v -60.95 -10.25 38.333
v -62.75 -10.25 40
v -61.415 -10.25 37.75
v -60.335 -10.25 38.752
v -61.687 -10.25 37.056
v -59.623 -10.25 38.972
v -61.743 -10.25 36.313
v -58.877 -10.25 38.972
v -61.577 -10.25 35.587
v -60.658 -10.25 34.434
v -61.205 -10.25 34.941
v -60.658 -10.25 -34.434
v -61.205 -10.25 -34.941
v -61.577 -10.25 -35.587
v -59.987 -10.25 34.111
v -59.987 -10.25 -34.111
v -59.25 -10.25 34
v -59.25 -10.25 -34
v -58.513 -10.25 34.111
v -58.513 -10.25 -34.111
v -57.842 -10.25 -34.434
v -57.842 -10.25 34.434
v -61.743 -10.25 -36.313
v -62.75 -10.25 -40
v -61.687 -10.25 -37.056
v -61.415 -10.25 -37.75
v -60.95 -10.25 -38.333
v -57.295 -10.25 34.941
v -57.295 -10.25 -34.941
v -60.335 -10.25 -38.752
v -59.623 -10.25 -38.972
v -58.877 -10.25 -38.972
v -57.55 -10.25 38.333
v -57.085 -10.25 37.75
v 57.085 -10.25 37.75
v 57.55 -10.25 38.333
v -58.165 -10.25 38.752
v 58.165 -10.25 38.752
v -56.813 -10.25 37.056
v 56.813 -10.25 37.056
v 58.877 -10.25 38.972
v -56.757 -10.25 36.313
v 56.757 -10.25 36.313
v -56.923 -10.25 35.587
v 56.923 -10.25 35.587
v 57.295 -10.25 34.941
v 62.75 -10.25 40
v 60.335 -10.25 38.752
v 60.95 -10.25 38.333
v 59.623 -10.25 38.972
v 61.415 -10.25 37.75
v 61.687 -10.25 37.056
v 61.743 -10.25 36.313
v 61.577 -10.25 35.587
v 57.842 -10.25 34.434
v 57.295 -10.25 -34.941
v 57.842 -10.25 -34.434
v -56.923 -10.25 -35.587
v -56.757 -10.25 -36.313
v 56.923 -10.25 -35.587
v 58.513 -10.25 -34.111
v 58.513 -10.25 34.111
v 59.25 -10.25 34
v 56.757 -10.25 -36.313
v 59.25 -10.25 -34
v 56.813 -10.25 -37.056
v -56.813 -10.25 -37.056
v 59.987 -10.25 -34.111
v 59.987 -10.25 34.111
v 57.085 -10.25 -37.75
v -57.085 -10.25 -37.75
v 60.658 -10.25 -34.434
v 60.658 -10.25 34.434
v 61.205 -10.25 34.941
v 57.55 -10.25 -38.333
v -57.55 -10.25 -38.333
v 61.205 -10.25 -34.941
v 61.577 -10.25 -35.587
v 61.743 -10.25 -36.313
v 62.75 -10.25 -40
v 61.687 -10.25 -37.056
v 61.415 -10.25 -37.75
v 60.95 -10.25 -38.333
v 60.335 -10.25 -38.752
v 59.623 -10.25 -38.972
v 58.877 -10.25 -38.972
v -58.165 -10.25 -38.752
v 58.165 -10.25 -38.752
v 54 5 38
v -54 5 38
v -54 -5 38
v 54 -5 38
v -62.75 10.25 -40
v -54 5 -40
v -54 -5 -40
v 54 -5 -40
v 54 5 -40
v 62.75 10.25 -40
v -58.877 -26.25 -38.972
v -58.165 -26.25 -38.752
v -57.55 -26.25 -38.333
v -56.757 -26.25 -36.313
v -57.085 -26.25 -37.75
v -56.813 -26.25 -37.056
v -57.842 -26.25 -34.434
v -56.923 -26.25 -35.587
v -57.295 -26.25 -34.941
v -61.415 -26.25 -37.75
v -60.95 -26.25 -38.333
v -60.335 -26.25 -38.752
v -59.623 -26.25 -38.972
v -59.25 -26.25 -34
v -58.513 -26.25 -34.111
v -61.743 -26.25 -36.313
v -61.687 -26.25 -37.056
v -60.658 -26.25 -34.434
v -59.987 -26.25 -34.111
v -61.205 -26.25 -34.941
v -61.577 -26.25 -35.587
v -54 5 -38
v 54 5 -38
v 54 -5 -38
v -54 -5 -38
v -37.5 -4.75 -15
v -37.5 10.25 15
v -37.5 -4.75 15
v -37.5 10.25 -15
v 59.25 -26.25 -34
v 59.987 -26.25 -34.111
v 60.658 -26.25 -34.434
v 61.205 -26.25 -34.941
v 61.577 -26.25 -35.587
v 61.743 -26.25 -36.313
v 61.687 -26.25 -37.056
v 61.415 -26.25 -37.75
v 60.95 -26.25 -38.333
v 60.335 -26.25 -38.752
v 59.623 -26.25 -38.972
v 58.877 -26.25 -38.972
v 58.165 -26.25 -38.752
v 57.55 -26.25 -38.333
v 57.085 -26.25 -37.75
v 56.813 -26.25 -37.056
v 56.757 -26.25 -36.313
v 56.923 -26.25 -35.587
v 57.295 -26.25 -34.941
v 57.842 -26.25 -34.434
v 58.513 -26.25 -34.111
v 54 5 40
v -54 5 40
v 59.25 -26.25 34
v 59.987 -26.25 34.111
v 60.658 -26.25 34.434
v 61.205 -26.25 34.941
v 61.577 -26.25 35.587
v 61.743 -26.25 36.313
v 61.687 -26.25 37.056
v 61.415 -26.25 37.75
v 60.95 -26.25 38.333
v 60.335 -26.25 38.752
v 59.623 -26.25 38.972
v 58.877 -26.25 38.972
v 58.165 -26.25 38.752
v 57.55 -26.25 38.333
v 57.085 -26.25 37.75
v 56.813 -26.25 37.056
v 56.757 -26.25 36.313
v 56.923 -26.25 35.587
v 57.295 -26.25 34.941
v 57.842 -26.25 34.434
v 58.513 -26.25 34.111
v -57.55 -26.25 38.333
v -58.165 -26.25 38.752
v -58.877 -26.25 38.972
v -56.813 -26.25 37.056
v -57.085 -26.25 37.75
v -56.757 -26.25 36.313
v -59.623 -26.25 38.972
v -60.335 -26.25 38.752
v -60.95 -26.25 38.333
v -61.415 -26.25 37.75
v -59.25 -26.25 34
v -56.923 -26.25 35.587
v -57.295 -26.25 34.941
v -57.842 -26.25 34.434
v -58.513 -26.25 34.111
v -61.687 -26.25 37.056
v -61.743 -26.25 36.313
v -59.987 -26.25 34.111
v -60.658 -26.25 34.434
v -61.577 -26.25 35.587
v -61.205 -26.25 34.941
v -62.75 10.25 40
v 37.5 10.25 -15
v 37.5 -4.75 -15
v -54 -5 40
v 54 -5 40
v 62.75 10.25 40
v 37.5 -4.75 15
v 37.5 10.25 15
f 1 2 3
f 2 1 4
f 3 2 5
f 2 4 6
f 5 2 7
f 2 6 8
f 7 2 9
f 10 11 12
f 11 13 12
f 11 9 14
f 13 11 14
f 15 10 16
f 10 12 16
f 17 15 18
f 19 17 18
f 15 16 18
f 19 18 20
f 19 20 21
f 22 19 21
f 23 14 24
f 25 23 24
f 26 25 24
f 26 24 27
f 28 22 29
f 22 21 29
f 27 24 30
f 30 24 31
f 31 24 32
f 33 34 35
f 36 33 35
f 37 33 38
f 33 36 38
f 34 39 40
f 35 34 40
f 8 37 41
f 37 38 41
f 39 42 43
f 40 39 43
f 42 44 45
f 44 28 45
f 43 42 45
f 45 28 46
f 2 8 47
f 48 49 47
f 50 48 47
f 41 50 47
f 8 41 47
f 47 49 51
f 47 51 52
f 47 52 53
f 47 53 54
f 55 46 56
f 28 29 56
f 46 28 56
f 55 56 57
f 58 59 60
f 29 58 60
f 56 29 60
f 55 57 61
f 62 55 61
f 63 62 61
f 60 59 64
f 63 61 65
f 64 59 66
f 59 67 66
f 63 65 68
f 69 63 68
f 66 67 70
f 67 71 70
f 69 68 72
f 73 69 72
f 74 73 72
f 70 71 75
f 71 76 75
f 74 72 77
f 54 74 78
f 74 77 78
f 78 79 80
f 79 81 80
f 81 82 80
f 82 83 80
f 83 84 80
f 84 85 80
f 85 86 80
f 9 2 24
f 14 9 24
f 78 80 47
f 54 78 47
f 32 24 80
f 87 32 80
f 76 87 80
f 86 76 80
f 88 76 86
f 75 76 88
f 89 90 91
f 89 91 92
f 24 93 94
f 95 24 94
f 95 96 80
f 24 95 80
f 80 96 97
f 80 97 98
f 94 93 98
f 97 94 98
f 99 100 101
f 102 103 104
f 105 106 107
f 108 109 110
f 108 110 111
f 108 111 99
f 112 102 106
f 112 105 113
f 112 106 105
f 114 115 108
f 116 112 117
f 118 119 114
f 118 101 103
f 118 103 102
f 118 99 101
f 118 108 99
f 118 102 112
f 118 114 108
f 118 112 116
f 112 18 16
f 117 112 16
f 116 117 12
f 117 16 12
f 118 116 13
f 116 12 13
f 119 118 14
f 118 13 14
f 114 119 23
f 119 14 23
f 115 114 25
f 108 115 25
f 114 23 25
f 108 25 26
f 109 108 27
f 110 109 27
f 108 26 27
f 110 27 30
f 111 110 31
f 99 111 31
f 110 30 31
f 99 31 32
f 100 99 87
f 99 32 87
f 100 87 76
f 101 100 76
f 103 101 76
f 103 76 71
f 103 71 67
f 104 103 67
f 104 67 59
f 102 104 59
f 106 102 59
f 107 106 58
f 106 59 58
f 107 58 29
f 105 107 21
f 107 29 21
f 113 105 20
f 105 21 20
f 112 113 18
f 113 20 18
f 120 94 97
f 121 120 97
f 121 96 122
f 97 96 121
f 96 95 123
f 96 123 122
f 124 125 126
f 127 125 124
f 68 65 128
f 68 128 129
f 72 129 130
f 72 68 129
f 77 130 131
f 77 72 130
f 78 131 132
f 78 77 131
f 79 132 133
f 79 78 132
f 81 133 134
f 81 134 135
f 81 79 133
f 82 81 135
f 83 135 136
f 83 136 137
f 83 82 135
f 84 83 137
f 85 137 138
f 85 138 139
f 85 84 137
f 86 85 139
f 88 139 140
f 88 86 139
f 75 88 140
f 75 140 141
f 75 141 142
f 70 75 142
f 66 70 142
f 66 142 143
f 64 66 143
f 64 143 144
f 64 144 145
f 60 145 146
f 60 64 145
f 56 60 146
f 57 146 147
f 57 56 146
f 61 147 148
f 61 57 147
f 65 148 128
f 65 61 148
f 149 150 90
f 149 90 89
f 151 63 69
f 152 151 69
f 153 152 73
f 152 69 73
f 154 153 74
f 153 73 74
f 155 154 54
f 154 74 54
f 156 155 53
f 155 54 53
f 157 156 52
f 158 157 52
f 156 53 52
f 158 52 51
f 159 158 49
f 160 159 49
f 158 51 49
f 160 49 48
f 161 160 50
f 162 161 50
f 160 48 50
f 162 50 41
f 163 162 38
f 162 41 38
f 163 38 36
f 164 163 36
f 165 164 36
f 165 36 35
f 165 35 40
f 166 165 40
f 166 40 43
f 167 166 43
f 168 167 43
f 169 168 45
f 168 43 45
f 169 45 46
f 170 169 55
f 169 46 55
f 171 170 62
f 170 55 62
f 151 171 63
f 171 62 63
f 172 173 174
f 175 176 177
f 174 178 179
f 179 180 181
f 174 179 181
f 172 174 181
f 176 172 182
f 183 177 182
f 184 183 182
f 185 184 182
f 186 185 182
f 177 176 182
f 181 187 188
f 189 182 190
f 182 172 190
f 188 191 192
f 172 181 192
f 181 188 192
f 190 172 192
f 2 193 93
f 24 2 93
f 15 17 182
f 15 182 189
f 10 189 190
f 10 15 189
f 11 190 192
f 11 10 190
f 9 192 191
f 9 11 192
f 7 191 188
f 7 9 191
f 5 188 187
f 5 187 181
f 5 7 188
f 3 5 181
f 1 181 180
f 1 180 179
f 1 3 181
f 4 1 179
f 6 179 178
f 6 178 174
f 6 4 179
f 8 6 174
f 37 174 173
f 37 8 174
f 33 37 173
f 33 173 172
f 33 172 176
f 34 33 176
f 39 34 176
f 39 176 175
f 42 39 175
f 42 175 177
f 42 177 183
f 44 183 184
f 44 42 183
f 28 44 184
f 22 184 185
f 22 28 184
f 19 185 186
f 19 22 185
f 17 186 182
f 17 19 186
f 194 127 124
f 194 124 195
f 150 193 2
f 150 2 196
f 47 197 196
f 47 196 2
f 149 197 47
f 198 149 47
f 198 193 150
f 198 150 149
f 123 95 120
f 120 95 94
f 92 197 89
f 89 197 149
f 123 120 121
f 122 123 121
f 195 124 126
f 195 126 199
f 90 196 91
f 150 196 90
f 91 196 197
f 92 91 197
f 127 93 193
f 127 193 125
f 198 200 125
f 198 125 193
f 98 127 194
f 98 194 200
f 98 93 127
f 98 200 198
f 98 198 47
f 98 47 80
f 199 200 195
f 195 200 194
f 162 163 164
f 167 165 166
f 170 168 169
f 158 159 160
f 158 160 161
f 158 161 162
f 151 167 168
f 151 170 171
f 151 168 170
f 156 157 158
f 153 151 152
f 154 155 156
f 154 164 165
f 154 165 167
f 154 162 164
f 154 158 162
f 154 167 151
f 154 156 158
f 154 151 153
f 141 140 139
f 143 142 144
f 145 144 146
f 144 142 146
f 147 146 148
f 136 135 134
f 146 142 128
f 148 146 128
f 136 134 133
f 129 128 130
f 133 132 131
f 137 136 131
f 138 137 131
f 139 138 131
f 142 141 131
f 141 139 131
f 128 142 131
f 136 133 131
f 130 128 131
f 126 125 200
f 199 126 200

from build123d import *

# Parameters (mm, degrees)
SKETCH_2_W                                 = 125.5
SKETCH_2_H                                 = 80
EXTRUDE_1_DEPTH                            = 10.25
SKETCH_3_W                                 = 75
SKETCH_3_H                                 = 30
CUT_EXTRUDE_1_DEPTH                        = 15
SKETCH_4_R                                 = 2.5
EXTRUDE_2_DEPTH                            = 16
MIRROR_1_AT_THE_SECOND_PLANE_COPY_1_SKET_R = 2.5
MIRROR_1_AT_THE_SECOND_PLANE_COPY_1_DEPTH  = 16
SKETCH_5_W                                 = 108
SKETCH_5_H                                 = 10
CUT_EXTRUDE_2_DEPTH                        = 2


with BuildPart() as part:
    # 草图2 → 凸台-拉伸1 (new, symmetric)
    with BuildSketch(Plane(origin=(0, 0, 0), x_dir=(1, 0, 0), z_dir=(0, 1, 0))):
        Rectangle(SKETCH_2_W, SKETCH_2_H)
    extrude(amount=EXTRUDE_1_DEPTH, both=True)

    # 草图3 → 切除-拉伸1 (cut)
    with BuildSketch(Plane(origin=(0, 10.25, 0), x_dir=(1, 0, 0), z_dir=(0, 1, 0))):
        Rectangle(SKETCH_3_W, SKETCH_3_H)
    extrude(amount=-CUT_EXTRUDE_1_DEPTH, mode=Mode.SUBTRACT)

    # 草图4 → 凸台-拉伸2 (add)
    with BuildSketch(Plane.XZ.offset(10.25)):
        with Locations(Location((59.25, 36.5, 0), (0, 0, 270))):
            Circle(SKETCH_4_R)
    extrude_2 = extrude(amount=EXTRUDE_2_DEPTH)

    # 镜向1: 凸台-拉伸2 across plane
    add(extrude_2.mirror(Plane(origin=(0, 0, 0), x_dir=(0, 0, 1), z_dir=(1, 0, 0))))

    # 镜向1 at the second plane: 凸台-拉伸2 across plane
    add(extrude_2.mirror(Plane.XY))

    # 镜向1 at the second plane copy 1 sket → 镜向1 at the second plane copy 1 (add)
    with BuildSketch(Plane(origin=(0, -10.25, 0), x_dir=(-1, 0, 0), z_dir=(0, -1, 0))):
        with Locations(Location((59.25, 36.5, 0), (0, 0, 270))):
            Circle(MIRROR_1_AT_THE_SECOND_PLANE_COPY_1_SKET_R)
    extrude(amount=MIRROR_1_AT_THE_SECOND_PLANE_COPY_1_DEPTH)

    # 草图5 → 切除-拉伸2 (cut)
    with BuildSketch(Plane.XY.offset(40)):
        Rectangle(SKETCH_5_W, SKETCH_5_H)
    cut_extrude_2 = extrude(amount=-CUT_EXTRUDE_2_DEPTH, mode=Mode.SUBTRACT)

    # 镜向2: 切除-拉伸2 across plane
    add(cut_extrude_2.mirror(Plane.XY), mode=Mode.SUBTRACT)


solid = part.part
